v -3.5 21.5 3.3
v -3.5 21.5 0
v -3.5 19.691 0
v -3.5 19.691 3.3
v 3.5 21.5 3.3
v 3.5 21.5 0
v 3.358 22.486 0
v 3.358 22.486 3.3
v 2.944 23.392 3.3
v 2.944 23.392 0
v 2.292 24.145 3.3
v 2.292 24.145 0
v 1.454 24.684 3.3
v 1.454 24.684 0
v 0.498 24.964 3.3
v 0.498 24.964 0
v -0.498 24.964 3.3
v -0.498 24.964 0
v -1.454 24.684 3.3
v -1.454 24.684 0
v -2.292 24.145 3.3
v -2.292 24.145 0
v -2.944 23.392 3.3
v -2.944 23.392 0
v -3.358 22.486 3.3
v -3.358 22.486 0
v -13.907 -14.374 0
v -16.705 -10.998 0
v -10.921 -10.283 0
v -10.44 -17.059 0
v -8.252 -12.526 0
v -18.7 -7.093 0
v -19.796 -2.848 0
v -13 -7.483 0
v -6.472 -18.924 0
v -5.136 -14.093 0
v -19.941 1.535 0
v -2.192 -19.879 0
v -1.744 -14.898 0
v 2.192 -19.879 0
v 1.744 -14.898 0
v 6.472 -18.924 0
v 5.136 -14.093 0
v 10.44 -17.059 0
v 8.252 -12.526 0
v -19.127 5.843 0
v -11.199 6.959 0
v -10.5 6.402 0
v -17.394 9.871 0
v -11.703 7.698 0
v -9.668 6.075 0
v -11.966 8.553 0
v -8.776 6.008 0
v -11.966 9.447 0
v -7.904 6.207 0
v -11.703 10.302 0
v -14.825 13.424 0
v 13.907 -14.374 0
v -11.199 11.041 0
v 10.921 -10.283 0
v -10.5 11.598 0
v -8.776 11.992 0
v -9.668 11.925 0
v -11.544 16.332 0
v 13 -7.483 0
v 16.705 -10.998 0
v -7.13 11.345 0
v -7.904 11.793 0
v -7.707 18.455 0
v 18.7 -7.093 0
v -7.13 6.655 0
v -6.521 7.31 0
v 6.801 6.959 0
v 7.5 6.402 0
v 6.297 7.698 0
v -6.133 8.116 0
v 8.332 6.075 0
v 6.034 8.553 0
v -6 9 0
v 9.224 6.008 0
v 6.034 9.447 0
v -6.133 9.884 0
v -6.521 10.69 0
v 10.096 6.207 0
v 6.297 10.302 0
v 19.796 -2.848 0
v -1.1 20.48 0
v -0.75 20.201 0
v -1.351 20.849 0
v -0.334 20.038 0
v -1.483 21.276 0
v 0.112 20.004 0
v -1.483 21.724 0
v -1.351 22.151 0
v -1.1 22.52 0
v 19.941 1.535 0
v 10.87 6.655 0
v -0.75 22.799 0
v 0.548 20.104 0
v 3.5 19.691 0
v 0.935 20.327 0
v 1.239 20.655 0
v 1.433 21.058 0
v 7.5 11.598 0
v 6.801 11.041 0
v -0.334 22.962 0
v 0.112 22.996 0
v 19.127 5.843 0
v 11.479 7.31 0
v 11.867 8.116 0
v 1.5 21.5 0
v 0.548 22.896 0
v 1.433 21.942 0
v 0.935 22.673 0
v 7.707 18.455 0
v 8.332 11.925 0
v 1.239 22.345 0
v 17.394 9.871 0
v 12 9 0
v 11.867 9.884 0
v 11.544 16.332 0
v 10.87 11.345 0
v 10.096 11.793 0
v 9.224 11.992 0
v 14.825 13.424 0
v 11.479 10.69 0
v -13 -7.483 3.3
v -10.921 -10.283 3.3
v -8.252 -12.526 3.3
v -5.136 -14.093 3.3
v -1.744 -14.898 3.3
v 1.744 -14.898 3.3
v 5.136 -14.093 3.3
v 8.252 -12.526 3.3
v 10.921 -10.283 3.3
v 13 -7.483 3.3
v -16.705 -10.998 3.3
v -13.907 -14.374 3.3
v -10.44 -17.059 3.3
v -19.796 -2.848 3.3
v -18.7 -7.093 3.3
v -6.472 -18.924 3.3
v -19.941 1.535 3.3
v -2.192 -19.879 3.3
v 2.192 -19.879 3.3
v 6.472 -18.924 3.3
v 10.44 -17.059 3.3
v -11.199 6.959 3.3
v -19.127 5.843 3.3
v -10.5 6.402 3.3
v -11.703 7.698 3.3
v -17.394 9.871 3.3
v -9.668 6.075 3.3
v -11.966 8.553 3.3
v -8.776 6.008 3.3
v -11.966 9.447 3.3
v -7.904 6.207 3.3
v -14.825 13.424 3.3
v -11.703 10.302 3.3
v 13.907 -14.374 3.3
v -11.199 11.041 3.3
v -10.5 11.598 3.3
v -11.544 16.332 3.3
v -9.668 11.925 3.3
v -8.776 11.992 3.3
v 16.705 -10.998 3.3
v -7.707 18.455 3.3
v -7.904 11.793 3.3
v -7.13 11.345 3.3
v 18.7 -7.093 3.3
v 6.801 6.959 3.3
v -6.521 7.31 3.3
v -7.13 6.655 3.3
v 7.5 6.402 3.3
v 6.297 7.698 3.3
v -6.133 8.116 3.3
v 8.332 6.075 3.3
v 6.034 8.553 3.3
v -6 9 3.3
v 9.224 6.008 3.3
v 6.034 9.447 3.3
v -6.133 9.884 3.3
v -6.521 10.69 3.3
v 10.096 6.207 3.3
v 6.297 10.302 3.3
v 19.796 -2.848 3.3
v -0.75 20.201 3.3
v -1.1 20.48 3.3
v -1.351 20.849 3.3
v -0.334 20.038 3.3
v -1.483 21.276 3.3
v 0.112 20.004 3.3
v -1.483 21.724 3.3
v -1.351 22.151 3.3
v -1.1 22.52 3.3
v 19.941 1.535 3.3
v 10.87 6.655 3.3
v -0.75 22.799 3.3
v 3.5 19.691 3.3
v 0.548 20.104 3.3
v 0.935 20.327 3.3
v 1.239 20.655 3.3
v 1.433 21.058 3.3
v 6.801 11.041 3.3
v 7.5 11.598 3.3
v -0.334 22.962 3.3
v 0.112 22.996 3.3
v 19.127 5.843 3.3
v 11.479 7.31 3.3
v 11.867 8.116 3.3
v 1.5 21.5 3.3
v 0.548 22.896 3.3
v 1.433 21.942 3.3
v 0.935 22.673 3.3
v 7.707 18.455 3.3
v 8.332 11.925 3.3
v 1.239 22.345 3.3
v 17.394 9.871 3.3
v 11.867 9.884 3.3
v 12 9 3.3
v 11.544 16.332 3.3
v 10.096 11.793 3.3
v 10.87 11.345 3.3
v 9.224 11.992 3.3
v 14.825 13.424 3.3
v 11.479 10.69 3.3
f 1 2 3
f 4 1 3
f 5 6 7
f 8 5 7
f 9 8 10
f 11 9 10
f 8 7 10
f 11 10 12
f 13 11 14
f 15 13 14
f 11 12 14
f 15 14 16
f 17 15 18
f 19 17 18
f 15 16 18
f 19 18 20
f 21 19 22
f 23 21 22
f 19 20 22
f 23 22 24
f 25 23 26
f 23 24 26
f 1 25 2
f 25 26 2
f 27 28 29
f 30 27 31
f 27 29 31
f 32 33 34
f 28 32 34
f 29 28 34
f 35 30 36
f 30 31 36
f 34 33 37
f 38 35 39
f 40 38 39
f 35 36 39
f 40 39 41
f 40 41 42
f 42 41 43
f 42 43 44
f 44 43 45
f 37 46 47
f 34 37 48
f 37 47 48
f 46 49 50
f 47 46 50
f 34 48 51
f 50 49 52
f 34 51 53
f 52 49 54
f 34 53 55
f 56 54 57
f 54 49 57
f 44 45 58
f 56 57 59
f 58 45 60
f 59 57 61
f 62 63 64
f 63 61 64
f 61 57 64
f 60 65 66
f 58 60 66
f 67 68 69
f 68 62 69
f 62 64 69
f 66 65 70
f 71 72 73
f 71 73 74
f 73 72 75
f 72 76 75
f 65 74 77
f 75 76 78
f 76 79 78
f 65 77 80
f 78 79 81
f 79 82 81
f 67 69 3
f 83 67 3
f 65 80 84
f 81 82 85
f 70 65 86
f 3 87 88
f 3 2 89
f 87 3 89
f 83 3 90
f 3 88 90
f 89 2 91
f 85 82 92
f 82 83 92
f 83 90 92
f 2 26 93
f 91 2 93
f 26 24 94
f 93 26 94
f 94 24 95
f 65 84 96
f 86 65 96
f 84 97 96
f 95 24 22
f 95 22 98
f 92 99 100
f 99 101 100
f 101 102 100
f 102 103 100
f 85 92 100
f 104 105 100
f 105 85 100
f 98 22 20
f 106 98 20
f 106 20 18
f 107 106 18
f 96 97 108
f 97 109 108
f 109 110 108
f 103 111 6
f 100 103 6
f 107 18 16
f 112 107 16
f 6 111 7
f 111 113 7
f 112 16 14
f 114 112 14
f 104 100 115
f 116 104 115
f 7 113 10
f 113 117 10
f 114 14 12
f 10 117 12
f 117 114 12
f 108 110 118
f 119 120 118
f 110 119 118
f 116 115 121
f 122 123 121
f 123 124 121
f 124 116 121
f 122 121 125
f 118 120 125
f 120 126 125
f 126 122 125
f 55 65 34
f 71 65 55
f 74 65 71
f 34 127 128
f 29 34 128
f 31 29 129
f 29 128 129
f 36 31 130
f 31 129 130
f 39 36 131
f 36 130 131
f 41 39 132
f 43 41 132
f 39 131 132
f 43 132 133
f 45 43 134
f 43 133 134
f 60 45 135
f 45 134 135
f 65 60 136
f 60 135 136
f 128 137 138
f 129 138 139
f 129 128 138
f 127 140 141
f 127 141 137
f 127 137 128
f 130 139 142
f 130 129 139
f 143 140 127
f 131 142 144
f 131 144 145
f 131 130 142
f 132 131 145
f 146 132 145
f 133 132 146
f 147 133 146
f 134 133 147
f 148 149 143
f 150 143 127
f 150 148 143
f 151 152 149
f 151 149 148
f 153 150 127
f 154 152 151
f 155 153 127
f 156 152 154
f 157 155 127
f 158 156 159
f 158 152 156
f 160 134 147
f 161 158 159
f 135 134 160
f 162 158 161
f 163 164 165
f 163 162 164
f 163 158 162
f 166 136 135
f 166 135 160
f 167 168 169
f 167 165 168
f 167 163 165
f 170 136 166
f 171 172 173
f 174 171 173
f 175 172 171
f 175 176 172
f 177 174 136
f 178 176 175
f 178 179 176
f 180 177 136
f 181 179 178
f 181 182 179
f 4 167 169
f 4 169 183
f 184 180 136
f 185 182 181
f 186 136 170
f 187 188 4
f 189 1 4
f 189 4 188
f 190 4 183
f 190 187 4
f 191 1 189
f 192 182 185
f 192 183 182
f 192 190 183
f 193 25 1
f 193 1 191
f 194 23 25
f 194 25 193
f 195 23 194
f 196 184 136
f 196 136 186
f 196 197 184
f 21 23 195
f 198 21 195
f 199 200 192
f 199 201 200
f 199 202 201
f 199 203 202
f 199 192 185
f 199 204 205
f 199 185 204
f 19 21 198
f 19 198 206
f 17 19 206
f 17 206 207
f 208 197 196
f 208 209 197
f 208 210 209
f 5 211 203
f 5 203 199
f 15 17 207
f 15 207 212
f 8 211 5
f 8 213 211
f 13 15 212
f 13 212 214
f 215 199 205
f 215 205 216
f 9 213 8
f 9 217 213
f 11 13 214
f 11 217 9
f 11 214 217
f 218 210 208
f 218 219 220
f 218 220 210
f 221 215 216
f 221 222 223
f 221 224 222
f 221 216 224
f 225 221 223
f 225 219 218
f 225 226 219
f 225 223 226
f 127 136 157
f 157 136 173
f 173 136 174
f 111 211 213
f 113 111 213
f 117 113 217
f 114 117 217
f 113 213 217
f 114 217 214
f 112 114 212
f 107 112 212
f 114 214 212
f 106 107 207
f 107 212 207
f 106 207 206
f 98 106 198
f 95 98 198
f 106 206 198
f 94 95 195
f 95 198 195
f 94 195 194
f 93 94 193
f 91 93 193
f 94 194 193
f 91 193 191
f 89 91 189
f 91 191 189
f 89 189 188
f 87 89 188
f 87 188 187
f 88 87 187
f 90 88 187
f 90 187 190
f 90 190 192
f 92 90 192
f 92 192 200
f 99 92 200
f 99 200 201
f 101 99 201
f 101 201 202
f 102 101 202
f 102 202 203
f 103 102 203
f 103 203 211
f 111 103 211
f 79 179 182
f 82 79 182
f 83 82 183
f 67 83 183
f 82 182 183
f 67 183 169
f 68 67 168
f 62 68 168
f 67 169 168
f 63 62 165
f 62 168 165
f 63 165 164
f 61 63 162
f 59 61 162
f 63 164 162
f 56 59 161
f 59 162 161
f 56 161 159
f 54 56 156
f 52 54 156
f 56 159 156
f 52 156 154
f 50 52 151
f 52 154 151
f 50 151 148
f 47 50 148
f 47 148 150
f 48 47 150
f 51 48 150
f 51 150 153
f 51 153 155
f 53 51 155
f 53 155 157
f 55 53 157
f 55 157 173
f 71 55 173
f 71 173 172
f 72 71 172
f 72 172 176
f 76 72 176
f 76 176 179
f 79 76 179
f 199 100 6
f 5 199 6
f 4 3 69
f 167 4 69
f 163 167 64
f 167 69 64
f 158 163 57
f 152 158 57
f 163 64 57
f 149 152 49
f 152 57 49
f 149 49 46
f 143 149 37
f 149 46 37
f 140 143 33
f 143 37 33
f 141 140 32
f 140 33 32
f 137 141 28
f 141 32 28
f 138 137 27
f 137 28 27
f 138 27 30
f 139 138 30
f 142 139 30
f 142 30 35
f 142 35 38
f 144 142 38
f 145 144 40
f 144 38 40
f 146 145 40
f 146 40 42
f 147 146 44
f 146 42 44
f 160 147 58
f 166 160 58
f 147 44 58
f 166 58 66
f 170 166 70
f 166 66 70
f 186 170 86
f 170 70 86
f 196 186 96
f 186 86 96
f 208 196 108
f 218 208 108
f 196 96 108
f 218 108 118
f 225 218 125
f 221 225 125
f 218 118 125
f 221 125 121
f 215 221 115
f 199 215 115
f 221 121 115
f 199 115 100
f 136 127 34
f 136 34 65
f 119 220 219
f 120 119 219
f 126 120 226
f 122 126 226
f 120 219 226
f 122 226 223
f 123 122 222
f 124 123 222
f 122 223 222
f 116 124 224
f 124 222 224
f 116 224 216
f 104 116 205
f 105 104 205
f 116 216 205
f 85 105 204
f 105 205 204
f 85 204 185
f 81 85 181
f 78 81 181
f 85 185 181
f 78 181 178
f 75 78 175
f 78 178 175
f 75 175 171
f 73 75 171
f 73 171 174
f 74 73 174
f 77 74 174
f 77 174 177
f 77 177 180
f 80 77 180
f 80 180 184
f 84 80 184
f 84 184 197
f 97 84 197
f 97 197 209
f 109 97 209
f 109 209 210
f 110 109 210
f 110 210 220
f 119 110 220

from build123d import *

# Parameters (mm, degrees)
EXTRUDE_DEPTH   = 3.3
SKETCH001_R     = 1.5
POCKET_DEPTH    = 3.301
SKETCH002_R     = 3
POCKET001_DEPTH = 5


with BuildPart() as part:
    # Sketch → Extrude (new body)
    with BuildSketch(Plane.XY):
        with BuildLine():
            ThreePointArc((3.5, 21.5), (0, 25), (-3.5, 21.5))
            Line((-3.5, 21.5), (-3.5, 19.691369))
            ThreePointArc((-3.5, 19.691369), (0, -20), (3.5, 19.691369))
            Line((3.5, 19.691369), (3.5, 21.5))
        make_face()
    extrude(amount=EXTRUDE_DEPTH)

    # Sketch001 (on Face6 of Extrude) → Pocket (cut, through all)
    with BuildSketch(Plane.XY.offset(3.3)):
        with Locations((0, 21.5)):
            Circle(SKETCH001_R)
    extrude(amount=-POCKET_DEPTH, mode=Mode.SUBTRACT)

    # Sketch002 → Pocket001 (cut)
    with BuildSketch(Plane.XY.offset(3.3)):
        with Locations((-9, 9)):
            Circle(SKETCH002_R)
        with Locations((9, 9)):
            Circle(SKETCH002_R)
        with BuildLine():
            Line((-13, -7.483315), (13, -7.483315))
            ThreePointArc((-13, -7.483315), (0, -15), (13, -7.483315))
        make_face()
    extrude(amount=-POCKET001_DEPTH, mode=Mode.SUBTRACT)


solid = part.part
